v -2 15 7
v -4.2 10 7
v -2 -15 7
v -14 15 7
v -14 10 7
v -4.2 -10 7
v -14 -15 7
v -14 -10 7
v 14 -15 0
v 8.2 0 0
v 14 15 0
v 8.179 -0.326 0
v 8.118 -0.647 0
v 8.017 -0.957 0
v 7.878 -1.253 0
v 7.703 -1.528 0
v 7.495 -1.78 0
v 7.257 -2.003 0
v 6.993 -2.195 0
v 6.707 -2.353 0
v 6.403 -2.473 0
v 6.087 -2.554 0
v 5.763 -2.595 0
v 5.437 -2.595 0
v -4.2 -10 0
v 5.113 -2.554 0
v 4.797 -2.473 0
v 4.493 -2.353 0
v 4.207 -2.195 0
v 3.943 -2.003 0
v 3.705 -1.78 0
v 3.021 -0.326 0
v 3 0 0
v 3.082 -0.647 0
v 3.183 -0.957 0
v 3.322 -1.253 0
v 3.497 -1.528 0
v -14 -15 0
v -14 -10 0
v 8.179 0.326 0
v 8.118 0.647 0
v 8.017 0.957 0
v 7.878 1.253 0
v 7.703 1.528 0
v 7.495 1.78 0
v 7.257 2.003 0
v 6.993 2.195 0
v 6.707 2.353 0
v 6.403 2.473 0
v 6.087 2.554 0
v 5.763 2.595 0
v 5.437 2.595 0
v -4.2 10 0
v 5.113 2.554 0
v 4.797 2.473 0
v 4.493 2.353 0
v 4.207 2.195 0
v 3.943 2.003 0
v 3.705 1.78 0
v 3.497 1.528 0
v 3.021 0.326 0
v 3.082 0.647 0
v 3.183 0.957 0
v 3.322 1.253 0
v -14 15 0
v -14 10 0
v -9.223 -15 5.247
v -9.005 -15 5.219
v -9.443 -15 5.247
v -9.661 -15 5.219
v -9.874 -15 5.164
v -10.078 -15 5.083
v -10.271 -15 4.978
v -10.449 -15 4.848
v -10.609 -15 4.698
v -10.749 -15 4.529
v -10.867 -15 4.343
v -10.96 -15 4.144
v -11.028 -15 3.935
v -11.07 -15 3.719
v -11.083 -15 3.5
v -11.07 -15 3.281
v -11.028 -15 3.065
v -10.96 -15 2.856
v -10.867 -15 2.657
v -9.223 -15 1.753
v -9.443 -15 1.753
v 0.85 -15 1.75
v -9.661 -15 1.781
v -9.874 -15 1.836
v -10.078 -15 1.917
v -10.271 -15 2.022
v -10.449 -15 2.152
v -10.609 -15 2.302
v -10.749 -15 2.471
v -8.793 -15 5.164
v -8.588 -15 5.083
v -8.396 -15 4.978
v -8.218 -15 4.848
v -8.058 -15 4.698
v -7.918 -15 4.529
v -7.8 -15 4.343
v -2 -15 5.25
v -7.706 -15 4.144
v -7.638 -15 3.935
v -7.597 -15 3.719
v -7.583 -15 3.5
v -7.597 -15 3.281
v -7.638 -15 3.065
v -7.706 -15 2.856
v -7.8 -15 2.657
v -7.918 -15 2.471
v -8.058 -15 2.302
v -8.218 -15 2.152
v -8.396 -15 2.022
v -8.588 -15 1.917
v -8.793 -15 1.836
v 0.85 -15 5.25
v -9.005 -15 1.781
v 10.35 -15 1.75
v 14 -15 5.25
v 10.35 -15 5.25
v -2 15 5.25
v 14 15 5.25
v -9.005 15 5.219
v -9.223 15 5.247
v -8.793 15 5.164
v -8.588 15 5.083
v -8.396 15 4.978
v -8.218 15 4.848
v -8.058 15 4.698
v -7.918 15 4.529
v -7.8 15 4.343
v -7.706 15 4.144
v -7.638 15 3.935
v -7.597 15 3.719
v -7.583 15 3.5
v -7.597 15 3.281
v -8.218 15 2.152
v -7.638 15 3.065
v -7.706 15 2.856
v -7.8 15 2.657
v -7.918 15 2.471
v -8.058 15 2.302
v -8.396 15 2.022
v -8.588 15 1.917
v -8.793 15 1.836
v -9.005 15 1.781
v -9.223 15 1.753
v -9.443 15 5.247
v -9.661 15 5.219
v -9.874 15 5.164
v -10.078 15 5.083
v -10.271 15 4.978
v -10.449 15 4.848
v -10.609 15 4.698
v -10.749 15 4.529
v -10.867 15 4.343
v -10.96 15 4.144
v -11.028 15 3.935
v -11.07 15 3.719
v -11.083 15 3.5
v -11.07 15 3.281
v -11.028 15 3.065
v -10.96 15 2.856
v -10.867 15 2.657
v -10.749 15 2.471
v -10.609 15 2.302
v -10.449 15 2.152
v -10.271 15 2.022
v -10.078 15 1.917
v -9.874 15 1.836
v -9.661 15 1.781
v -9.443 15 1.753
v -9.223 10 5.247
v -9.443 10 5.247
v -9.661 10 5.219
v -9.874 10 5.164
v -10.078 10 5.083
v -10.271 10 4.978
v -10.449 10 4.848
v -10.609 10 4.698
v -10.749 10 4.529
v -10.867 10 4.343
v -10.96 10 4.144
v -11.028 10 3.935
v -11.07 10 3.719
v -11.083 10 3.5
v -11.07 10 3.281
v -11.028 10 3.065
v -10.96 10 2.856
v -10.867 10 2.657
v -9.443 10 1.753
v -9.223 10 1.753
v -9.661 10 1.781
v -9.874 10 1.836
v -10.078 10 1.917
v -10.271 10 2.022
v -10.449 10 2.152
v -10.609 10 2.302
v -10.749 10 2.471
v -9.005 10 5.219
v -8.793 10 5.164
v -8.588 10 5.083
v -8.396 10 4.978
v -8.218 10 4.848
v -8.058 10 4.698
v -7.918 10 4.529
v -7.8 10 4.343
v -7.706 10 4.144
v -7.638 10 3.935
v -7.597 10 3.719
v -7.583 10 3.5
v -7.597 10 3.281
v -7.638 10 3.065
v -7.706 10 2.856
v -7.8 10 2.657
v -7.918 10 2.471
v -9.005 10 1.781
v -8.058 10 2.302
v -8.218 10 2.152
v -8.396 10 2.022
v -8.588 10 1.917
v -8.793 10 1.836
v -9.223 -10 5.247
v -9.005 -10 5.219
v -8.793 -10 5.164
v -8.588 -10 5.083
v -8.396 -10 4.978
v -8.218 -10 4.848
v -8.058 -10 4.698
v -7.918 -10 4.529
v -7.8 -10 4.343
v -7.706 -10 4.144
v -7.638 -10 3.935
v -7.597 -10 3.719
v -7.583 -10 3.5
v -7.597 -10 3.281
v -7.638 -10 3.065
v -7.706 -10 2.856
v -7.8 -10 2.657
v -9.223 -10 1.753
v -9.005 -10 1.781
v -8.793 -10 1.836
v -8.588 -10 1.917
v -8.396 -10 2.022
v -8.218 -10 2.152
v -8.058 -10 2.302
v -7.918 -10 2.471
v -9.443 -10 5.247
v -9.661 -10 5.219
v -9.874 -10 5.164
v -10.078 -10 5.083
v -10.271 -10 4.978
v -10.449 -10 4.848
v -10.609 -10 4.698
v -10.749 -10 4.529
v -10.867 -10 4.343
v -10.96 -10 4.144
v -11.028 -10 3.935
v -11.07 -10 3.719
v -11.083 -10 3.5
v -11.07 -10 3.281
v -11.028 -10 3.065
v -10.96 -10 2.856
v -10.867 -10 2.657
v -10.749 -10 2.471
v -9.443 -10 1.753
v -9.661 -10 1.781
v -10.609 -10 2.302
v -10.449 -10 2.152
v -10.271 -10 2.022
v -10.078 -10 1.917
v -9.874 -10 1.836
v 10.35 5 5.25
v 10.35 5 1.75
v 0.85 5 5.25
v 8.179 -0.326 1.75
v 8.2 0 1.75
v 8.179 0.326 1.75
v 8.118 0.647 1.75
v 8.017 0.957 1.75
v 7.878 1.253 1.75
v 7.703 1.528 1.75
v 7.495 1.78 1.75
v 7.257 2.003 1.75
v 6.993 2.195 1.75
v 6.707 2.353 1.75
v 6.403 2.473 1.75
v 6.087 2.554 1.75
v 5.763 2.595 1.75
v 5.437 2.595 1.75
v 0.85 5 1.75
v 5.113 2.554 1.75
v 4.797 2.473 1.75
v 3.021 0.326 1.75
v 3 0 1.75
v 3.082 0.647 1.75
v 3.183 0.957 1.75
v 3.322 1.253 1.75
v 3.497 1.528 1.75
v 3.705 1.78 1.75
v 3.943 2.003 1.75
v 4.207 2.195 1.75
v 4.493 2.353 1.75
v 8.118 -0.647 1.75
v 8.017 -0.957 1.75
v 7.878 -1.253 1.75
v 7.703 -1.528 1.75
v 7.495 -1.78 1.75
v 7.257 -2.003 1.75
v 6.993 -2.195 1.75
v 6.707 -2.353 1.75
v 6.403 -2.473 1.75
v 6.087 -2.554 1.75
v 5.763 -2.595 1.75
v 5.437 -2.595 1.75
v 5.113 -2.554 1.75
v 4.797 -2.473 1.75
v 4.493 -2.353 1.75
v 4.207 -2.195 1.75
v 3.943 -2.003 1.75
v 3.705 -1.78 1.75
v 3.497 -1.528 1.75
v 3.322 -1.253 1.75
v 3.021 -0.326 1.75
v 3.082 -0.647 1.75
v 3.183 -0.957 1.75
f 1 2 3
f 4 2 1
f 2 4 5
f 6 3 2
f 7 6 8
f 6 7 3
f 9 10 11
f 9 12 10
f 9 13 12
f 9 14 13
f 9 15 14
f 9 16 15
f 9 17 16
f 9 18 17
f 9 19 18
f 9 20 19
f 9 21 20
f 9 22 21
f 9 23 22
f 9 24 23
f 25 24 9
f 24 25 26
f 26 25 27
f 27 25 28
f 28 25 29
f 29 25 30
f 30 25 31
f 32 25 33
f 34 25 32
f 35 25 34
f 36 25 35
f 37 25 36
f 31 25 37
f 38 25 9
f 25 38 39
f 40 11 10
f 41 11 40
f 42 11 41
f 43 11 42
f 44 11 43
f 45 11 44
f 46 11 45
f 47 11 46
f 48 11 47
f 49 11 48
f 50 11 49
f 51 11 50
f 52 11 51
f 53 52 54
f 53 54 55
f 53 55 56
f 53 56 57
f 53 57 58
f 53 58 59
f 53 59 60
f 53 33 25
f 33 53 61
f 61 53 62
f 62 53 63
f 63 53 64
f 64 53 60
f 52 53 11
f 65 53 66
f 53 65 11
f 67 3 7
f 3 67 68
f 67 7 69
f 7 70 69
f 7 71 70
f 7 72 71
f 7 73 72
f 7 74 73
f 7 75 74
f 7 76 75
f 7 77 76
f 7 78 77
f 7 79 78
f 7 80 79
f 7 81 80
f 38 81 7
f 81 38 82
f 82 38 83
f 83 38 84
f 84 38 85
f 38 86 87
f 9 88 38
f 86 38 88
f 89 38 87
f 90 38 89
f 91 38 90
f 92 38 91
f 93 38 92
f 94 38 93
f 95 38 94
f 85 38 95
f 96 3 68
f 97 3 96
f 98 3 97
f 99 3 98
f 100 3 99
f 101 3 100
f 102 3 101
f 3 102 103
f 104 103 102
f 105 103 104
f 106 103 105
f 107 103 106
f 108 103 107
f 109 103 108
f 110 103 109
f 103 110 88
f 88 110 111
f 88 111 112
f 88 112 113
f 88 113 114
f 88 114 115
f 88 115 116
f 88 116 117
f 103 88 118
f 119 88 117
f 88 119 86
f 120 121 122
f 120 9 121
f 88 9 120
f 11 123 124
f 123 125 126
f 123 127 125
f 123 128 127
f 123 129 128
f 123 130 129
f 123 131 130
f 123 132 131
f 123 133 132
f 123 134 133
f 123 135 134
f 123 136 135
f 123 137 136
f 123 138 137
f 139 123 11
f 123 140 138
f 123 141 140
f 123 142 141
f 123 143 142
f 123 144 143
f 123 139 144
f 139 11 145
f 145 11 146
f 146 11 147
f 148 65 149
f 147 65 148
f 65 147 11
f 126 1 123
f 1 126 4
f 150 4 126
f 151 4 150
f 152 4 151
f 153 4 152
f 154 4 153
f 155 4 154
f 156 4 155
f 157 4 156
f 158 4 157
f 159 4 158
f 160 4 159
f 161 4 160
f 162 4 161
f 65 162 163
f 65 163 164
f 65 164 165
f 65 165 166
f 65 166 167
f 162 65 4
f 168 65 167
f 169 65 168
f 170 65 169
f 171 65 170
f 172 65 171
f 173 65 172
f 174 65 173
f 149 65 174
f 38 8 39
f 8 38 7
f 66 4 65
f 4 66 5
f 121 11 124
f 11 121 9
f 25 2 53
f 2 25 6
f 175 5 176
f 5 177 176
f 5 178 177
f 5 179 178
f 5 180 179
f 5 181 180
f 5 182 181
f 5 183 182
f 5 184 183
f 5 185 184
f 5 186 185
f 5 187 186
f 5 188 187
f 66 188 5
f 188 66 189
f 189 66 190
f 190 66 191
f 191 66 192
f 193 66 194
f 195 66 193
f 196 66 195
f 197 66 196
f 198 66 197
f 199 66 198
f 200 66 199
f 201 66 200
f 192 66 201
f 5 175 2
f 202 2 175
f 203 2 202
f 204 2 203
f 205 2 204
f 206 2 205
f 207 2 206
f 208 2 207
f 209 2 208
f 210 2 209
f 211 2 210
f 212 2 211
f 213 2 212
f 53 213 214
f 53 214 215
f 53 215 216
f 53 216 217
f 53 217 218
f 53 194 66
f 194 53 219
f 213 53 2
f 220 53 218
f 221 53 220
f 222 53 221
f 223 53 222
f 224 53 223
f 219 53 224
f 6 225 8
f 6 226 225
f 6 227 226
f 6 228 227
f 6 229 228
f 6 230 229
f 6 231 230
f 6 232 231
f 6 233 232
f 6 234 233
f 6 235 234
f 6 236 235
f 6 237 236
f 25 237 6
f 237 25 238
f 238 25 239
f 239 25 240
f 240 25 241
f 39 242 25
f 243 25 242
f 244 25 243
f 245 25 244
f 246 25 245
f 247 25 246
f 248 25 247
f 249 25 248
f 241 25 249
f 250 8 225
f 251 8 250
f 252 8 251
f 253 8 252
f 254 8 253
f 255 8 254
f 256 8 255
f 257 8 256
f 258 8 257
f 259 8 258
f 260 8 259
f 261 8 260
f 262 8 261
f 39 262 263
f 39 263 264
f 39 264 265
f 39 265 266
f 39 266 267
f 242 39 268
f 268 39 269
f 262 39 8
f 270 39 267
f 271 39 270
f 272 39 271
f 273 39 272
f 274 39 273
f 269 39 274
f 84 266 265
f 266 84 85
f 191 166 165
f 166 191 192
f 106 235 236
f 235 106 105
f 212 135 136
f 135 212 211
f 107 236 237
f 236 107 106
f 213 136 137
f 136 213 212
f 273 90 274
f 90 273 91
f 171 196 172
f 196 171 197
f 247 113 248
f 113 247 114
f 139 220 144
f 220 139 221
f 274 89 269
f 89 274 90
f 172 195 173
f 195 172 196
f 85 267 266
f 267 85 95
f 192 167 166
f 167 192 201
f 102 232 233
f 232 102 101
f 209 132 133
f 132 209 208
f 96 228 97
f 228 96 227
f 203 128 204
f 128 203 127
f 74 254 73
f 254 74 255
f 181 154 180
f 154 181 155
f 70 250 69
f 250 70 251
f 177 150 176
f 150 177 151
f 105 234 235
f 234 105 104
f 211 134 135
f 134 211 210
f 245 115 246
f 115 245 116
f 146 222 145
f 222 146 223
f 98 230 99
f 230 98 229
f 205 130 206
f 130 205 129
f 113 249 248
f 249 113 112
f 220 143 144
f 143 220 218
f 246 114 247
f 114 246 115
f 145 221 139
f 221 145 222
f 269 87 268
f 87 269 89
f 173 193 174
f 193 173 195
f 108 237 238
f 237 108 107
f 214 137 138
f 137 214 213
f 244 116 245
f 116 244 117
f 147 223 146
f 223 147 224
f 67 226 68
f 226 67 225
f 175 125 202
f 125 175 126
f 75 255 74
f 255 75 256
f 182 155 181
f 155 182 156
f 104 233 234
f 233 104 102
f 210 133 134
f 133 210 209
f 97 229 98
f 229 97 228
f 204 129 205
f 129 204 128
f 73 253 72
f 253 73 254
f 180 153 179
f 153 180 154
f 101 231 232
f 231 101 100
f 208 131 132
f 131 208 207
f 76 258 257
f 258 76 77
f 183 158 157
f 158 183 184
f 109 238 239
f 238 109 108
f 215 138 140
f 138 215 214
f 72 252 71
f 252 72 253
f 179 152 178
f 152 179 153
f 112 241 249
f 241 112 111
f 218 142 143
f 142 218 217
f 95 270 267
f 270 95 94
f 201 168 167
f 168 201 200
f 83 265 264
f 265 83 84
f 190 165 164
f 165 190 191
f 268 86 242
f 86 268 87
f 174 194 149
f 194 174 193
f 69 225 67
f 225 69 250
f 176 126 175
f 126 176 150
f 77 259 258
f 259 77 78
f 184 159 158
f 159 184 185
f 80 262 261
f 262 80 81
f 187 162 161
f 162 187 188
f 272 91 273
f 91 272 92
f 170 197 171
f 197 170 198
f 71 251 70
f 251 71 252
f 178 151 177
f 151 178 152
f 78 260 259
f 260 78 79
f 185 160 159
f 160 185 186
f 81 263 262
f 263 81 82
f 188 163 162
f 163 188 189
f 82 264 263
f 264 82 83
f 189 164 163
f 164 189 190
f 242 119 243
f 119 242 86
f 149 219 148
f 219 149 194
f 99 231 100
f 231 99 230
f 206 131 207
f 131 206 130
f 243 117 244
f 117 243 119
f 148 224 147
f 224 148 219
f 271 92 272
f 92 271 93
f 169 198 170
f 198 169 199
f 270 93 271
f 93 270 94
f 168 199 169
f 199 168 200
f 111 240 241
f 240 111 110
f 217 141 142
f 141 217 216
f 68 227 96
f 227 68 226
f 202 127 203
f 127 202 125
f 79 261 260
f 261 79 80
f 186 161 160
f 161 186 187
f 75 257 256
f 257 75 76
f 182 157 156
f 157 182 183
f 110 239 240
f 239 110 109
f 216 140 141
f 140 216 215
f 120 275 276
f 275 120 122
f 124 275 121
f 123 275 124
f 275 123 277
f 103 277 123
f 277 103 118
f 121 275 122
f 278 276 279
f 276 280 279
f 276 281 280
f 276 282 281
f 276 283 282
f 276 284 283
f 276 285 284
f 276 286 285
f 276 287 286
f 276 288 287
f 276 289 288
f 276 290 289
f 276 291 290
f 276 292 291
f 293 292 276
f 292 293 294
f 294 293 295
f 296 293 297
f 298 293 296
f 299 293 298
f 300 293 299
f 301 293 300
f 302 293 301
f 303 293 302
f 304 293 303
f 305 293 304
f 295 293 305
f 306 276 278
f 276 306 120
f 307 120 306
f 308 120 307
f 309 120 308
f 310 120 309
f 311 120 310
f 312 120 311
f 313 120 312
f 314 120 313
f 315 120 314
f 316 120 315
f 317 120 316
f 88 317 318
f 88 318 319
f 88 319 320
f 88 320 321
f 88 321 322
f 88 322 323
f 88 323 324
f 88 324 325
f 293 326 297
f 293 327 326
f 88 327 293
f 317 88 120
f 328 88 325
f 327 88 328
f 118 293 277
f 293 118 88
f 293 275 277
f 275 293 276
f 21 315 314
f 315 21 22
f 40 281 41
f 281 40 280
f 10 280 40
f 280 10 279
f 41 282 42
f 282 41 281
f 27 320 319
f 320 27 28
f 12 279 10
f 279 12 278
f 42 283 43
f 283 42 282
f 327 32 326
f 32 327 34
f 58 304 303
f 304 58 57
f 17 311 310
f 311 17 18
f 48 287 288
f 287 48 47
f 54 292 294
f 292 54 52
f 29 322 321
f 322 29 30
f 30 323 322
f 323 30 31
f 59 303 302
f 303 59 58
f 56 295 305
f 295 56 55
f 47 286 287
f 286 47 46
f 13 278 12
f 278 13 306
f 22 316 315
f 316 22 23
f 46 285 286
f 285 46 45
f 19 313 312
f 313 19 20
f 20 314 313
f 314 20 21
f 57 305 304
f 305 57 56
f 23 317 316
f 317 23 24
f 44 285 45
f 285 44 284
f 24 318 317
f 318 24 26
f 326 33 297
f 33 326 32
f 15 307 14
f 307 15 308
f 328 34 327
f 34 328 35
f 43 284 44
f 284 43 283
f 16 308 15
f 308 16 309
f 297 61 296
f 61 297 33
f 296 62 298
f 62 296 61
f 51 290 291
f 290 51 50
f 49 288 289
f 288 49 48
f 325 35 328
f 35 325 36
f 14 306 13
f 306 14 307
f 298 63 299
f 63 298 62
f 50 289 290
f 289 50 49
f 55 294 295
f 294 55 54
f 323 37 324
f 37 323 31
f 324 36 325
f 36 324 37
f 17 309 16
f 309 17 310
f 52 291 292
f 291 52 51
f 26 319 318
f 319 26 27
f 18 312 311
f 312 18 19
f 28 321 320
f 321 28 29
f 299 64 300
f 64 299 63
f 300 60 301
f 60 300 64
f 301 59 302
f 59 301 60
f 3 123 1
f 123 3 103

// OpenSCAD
//include <MCAD/boxes.scad>

width = 28;
height = 7;
nut_depth = 3.5;
nut_width = 9.5;
rod_r = 2.6;
hinge_pin_r = 1.75;

difference() {
        translate([0, 0, height/2]) rotate([90, 90, 0]) cube([height, width, 30], true);
        // hinge cutout
        translate([-width/2, 0, height/2]) cube([width*.7, 20, height * 2], true);
        // hinge pin
        translate([-width/3, 0, height/2]) rotate([90, 0, 0]) cylinder(r=hinge_pin_r, h=100, center=true, $fn=50);
        // nut hole
        translate([width/5, -20, height - nut_depth]) cube([nut_width, 50, nut_depth], true);
        // axle hole
        translate([width/5, 0, 0]) rotate([0, 0, 0]) cylinder(r=rod_r, h=100, center=true, $fn=50);

        // remove the top for printing
        #translate([width / 2 - 2, 0, height]) cube([width, 50, nut_depth], true);
}
